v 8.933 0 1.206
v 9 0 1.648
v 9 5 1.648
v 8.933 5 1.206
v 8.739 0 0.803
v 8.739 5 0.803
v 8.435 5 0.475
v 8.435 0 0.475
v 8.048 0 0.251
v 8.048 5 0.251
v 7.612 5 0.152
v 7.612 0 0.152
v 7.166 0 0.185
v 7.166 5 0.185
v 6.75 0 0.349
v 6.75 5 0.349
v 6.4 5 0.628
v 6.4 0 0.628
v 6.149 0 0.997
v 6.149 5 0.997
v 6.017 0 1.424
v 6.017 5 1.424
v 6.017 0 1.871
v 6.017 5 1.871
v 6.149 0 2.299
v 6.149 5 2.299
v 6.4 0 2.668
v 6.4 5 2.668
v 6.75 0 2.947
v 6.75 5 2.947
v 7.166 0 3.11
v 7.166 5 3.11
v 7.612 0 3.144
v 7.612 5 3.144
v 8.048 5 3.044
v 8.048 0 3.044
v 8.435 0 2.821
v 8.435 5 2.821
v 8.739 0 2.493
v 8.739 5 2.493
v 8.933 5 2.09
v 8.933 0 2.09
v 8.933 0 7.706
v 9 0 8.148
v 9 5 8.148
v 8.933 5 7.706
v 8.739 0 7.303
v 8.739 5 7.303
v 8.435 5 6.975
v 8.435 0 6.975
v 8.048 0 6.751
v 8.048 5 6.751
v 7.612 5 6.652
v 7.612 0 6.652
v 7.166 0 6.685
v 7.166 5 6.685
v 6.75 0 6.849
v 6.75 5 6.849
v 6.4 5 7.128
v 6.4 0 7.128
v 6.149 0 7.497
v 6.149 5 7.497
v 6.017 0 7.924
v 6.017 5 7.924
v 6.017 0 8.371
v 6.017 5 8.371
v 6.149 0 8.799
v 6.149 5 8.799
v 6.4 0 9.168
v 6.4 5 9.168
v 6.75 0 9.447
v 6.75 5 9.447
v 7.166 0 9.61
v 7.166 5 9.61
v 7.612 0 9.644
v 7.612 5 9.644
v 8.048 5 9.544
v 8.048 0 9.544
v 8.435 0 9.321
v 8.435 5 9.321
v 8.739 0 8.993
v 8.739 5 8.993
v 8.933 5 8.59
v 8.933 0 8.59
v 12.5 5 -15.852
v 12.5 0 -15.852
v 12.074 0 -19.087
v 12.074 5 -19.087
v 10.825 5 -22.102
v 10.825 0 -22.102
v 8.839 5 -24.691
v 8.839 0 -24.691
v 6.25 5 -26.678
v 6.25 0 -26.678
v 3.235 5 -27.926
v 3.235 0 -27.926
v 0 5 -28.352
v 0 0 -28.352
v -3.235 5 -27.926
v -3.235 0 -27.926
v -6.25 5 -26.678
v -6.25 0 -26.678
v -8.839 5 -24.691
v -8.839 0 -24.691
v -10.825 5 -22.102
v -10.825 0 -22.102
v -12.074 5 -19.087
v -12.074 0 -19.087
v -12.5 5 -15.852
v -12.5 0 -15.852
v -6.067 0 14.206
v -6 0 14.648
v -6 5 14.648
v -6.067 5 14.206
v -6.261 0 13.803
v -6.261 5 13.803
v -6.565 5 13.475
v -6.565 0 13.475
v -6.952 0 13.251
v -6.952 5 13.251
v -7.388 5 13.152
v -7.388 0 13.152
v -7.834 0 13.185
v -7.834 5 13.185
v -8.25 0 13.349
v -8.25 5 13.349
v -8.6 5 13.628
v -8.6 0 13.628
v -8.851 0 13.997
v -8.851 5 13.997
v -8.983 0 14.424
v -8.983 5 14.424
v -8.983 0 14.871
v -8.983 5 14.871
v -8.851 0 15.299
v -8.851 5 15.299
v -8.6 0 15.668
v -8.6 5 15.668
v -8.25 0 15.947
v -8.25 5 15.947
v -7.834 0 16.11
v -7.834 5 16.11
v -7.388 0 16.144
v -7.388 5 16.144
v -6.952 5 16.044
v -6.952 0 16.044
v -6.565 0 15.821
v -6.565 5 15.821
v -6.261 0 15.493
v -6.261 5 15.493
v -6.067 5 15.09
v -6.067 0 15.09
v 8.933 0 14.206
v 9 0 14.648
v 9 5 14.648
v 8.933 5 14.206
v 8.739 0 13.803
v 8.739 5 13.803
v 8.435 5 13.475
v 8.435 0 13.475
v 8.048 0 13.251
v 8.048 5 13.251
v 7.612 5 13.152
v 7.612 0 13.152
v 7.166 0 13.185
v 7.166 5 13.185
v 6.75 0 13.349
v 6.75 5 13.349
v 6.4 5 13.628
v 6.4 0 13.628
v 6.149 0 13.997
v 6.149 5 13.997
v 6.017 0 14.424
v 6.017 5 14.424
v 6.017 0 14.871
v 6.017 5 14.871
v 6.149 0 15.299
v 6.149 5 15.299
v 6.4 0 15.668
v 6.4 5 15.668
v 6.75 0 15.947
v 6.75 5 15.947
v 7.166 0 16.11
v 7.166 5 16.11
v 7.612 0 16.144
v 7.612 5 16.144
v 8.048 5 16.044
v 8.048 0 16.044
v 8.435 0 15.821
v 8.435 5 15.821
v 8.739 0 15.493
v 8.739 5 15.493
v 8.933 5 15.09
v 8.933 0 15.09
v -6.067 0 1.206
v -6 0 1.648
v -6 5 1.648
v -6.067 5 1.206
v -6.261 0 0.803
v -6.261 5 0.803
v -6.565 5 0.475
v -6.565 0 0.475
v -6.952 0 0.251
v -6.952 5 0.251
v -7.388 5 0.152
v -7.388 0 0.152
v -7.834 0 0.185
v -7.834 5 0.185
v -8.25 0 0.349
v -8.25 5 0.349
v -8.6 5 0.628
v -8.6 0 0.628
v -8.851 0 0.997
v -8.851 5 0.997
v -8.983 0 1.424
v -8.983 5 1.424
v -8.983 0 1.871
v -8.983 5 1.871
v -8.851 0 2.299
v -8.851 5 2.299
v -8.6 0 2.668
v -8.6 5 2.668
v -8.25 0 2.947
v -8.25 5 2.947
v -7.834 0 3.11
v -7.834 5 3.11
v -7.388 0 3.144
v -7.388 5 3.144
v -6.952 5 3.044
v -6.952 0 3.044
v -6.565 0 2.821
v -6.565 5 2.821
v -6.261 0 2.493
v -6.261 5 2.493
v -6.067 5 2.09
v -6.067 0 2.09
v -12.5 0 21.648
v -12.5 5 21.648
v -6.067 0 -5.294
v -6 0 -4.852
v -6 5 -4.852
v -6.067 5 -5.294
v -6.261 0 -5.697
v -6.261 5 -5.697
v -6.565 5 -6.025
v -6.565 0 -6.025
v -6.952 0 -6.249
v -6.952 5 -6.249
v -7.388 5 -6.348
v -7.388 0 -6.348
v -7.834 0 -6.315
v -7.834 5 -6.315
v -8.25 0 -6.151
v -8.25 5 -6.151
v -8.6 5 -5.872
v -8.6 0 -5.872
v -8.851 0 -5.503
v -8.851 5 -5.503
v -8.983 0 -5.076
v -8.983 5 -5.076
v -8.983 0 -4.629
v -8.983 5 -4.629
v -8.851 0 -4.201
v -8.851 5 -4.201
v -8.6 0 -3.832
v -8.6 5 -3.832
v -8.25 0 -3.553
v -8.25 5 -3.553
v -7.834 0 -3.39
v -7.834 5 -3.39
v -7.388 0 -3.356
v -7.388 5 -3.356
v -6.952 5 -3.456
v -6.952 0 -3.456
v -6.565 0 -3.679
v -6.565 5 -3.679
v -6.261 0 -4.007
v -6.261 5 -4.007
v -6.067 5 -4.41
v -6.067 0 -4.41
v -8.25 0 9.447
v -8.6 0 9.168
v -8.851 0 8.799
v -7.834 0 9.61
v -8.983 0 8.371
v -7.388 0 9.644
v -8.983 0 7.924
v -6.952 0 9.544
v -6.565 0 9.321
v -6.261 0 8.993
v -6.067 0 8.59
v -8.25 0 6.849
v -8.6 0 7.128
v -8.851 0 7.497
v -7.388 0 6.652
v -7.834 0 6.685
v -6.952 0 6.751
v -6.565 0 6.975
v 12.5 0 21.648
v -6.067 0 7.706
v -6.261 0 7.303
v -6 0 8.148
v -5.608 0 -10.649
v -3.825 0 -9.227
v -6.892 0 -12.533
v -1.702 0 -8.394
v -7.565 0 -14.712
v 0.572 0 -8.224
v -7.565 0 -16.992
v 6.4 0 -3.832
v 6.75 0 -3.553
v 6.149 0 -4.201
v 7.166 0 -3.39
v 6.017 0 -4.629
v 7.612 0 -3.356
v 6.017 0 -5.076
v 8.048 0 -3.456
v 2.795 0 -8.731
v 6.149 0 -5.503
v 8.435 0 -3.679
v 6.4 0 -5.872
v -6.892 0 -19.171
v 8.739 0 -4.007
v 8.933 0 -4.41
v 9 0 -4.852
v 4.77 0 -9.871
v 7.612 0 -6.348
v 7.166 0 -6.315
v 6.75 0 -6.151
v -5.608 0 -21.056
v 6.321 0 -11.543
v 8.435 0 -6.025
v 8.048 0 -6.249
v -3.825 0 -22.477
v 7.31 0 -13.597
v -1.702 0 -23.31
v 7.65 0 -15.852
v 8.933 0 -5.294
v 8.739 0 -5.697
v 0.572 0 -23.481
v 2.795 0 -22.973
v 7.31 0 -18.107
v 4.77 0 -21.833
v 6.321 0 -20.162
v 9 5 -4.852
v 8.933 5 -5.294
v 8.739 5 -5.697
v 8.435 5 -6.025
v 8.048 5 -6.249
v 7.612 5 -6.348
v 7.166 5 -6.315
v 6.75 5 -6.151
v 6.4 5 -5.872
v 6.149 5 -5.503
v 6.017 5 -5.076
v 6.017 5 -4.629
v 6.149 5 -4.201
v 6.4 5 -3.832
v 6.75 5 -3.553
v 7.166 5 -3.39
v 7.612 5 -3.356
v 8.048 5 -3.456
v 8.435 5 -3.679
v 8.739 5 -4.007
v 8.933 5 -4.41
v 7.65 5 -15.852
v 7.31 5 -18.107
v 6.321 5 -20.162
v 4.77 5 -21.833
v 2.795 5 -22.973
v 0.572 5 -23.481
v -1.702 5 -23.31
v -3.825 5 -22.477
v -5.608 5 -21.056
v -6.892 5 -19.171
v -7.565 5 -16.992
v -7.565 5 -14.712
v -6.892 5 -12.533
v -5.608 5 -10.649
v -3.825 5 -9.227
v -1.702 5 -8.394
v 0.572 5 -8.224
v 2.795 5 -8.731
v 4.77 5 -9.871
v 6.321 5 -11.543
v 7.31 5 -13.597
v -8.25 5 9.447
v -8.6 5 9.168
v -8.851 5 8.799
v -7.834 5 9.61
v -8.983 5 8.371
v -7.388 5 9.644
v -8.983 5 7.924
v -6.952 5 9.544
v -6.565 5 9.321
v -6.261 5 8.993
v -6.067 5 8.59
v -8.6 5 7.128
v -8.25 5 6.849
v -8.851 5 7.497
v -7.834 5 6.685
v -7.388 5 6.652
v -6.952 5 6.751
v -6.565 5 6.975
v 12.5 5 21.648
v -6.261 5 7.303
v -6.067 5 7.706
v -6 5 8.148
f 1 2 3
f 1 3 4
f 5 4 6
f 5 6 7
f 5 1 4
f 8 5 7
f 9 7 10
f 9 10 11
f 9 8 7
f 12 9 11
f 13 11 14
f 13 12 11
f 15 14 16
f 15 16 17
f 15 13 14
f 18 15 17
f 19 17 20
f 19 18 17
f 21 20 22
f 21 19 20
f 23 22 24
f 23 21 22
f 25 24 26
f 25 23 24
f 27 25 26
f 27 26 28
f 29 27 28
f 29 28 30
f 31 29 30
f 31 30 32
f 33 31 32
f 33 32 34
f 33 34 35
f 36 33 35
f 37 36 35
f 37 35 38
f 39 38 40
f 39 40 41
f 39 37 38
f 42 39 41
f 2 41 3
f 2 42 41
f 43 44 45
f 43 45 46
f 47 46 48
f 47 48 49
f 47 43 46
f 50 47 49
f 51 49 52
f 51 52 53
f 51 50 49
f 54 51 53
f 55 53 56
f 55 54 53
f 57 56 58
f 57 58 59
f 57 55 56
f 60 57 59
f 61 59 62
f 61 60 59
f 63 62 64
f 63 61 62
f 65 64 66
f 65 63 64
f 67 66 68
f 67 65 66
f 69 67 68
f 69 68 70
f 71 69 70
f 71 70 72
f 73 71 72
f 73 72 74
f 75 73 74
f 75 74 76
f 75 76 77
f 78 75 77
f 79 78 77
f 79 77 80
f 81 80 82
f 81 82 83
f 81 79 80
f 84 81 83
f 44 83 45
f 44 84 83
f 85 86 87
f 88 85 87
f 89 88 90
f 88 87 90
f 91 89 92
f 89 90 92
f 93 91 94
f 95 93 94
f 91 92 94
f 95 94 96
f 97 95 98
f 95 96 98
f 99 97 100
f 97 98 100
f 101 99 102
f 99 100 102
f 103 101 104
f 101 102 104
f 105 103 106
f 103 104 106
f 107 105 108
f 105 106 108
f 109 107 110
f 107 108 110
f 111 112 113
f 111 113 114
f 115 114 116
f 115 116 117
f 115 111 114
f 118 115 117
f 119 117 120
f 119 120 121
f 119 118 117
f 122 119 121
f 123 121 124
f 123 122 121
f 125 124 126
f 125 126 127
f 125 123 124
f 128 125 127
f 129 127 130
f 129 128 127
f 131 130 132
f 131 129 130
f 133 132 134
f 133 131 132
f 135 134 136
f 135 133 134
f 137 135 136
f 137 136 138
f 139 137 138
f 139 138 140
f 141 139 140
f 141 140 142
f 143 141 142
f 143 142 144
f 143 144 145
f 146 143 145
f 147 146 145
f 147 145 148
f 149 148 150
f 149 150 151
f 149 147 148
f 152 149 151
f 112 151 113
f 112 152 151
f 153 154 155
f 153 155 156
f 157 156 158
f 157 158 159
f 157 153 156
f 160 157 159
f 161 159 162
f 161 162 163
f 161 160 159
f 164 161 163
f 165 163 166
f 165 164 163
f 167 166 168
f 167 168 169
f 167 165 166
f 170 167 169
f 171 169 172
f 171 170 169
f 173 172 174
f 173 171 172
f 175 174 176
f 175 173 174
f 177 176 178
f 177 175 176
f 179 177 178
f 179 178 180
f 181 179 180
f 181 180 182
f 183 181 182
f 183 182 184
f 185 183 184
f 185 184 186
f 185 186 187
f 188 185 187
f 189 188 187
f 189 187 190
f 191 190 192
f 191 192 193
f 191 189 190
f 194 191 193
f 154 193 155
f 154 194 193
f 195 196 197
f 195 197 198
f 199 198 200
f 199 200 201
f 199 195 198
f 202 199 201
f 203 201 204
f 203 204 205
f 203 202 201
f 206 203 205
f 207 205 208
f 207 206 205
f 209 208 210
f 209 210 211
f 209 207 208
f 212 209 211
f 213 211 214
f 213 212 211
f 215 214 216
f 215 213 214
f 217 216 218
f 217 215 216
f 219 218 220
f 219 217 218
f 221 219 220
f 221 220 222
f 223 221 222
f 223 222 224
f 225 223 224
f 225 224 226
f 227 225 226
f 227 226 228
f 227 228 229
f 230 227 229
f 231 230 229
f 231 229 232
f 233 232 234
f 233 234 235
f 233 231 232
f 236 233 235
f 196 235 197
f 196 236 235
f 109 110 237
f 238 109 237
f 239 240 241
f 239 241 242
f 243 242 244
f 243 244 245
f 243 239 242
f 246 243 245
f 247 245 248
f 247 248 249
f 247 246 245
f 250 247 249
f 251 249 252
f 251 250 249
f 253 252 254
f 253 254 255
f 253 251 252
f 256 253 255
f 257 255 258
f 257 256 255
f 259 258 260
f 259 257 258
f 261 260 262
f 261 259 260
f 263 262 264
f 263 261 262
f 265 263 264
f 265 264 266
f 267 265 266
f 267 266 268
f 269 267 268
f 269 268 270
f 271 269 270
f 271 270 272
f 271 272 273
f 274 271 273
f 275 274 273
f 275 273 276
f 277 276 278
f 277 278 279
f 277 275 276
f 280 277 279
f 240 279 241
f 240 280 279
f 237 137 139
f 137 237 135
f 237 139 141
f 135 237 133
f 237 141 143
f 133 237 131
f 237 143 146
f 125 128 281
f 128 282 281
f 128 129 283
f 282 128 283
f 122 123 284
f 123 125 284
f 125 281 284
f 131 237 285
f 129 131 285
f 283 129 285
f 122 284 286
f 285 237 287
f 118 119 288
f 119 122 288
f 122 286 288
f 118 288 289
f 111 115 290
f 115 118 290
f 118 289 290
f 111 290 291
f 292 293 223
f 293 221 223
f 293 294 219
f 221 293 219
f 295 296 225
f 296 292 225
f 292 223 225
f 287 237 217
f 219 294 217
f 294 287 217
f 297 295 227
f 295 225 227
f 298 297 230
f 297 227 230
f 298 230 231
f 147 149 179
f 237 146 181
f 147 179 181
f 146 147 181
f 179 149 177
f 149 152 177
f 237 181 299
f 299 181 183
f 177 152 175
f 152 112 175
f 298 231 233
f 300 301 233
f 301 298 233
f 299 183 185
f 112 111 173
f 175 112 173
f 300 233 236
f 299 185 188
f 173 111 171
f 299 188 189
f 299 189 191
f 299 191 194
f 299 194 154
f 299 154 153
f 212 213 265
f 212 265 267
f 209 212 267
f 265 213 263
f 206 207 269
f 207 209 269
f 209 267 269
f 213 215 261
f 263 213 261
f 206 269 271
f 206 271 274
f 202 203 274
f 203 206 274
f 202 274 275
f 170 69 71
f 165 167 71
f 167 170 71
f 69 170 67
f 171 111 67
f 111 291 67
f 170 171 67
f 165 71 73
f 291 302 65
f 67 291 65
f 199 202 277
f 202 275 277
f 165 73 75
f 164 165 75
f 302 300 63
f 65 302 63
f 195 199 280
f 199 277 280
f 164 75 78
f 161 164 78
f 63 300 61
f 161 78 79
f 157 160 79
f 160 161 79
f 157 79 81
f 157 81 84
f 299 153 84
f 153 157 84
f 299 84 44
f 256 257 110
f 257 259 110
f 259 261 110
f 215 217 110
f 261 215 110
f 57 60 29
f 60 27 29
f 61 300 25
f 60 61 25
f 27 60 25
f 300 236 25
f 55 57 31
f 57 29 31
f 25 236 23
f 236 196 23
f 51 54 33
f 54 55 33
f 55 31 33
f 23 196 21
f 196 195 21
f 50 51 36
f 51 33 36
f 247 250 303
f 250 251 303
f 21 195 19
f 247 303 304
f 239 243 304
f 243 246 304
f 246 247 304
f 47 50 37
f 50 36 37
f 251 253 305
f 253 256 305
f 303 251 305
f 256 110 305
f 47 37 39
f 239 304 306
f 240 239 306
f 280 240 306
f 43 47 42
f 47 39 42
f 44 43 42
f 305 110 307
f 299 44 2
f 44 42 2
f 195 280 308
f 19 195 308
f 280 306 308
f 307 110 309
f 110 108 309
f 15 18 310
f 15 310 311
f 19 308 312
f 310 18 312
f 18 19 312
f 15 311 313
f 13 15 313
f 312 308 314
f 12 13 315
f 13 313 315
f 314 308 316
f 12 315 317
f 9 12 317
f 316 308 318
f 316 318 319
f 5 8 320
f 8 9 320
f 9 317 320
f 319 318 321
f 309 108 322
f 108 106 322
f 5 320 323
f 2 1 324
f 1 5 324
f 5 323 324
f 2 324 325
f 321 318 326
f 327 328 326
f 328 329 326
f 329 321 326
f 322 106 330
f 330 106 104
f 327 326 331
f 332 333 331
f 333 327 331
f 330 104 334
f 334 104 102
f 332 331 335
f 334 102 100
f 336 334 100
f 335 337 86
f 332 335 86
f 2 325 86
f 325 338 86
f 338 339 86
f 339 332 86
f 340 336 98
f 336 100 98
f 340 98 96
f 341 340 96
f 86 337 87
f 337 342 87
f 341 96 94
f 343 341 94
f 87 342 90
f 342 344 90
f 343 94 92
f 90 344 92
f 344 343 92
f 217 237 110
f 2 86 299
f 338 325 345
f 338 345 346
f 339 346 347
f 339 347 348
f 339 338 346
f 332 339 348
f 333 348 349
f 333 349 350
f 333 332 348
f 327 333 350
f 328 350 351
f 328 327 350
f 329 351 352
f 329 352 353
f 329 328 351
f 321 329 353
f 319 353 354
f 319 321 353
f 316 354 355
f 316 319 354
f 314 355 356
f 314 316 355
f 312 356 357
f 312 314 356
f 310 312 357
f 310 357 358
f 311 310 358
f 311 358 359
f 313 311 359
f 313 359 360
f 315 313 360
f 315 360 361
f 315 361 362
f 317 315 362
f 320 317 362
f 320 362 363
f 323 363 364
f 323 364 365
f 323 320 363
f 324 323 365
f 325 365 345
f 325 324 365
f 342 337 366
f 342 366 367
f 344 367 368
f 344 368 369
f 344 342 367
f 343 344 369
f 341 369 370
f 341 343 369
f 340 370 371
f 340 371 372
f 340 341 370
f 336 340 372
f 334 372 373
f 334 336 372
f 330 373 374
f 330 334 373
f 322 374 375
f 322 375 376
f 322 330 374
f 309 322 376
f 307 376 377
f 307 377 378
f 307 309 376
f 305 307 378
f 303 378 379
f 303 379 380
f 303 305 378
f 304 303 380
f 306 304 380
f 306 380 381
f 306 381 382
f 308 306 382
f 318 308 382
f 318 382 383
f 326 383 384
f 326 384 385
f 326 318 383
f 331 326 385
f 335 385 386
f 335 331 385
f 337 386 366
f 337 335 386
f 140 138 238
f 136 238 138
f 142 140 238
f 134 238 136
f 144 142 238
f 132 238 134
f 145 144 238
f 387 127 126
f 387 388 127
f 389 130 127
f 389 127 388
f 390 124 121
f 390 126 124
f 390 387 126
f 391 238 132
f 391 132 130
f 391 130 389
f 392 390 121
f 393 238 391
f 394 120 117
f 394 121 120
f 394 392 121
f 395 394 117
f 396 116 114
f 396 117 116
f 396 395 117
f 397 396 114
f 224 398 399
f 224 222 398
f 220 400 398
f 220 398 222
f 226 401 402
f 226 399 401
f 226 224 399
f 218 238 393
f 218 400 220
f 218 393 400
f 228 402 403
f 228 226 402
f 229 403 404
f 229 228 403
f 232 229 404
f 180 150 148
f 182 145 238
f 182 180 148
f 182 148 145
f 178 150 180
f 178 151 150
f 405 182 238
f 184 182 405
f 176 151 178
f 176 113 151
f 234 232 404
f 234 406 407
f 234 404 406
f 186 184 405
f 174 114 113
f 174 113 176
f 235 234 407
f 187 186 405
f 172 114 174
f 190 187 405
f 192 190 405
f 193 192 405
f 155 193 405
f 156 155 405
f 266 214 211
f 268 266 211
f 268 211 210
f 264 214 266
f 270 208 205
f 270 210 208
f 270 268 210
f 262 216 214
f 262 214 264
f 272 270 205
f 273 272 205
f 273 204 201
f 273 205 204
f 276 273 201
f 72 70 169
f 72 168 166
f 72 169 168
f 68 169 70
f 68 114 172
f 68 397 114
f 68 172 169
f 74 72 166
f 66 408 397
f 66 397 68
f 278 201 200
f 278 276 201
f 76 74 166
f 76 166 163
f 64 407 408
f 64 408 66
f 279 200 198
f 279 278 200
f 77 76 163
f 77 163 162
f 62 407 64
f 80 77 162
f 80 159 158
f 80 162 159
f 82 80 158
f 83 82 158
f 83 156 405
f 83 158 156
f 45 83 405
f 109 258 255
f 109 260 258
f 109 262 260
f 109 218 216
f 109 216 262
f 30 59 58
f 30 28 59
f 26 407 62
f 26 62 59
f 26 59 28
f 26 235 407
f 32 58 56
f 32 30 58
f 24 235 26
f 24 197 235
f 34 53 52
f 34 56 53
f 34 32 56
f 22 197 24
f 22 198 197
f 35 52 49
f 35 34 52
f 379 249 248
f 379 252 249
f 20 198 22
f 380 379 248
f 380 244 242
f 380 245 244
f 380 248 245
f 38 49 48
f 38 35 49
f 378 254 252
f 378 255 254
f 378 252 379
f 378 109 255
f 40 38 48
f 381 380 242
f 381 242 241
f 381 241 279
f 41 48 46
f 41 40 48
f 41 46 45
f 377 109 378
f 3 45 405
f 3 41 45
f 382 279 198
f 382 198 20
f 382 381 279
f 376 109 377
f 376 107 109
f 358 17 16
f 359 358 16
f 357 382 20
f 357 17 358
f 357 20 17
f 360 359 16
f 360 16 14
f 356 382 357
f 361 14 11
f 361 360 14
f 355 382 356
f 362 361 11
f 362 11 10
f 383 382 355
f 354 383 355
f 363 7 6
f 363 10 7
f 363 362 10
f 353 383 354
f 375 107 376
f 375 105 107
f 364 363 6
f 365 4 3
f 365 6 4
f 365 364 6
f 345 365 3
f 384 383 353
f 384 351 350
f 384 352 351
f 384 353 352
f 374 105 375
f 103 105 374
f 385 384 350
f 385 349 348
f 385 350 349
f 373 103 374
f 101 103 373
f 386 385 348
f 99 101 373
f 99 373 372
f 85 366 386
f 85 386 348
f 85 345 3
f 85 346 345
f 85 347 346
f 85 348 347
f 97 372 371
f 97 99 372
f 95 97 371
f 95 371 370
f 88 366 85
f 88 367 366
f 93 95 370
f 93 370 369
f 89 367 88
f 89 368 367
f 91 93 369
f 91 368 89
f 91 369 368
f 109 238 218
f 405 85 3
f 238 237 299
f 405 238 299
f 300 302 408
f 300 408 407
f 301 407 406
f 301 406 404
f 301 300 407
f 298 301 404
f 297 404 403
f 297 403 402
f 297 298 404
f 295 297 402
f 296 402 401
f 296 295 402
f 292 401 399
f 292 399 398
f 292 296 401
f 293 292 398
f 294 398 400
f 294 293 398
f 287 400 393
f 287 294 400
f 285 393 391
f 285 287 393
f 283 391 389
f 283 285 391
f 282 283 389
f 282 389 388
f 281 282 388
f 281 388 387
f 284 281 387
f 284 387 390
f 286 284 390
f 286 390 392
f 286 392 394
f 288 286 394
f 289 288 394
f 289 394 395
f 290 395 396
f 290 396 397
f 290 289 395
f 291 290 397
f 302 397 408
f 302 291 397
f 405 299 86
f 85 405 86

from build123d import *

# Parameters (mm, degrees)
SKETCH_1_R      = 7.65
SKETCH_1_R_2    = 1.5
EXTRUDE_1_DEPTH = 5


with BuildPart() as part:
    # Эскиз1 → Бобышка-Вытянуть1 (new body)
    with BuildSketch(Plane(origin=(0, 0, 0), x_dir=(1, 0, 0), z_dir=(0, 1, 0))):
        with BuildLine():
            Line((-12.5, 15.852233677), (-12.5, -21.647766323))
            Line((-12.5, -21.647766323), (12.5, -21.647766323))
            Line((12.5, -21.647766323), (12.5, 15.852233677))
            ThreePointArc((12.5, 15.852233677), (0, 28.352233677), (-12.5, 15.852233677))
        make_face()
        with Locations((0, 15.852233677)):
            Circle(SKETCH_1_R, mode=Mode.SUBTRACT)
        with Locations((-7.5, -14.647766323)):
            Circle(SKETCH_1_R_2, mode=Mode.SUBTRACT)
        with Locations((7.5, -14.647766323)):
            Circle(SKETCH_1_R_2, mode=Mode.SUBTRACT)
        with Locations((-7.5, -8.147766323)):
            Circle(SKETCH_1_R_2, mode=Mode.SUBTRACT)
        with Locations((7.5, -8.147766323)):
            Circle(SKETCH_1_R_2, mode=Mode.SUBTRACT)
        with Locations((-7.5, -1.647766323)):
            Circle(SKETCH_1_R_2, mode=Mode.SUBTRACT)
        with Locations((7.5, -1.647766323)):
            Circle(SKETCH_1_R_2, mode=Mode.SUBTRACT)
        with Locations((-7.5, 4.852233677)):
            Circle(SKETCH_1_R_2, mode=Mode.SUBTRACT)
        with Locations((7.5, 4.852233677)):
            Circle(SKETCH_1_R_2, mode=Mode.SUBTRACT)
    extrude(amount=EXTRUDE_1_DEPTH)


solid = part.part
